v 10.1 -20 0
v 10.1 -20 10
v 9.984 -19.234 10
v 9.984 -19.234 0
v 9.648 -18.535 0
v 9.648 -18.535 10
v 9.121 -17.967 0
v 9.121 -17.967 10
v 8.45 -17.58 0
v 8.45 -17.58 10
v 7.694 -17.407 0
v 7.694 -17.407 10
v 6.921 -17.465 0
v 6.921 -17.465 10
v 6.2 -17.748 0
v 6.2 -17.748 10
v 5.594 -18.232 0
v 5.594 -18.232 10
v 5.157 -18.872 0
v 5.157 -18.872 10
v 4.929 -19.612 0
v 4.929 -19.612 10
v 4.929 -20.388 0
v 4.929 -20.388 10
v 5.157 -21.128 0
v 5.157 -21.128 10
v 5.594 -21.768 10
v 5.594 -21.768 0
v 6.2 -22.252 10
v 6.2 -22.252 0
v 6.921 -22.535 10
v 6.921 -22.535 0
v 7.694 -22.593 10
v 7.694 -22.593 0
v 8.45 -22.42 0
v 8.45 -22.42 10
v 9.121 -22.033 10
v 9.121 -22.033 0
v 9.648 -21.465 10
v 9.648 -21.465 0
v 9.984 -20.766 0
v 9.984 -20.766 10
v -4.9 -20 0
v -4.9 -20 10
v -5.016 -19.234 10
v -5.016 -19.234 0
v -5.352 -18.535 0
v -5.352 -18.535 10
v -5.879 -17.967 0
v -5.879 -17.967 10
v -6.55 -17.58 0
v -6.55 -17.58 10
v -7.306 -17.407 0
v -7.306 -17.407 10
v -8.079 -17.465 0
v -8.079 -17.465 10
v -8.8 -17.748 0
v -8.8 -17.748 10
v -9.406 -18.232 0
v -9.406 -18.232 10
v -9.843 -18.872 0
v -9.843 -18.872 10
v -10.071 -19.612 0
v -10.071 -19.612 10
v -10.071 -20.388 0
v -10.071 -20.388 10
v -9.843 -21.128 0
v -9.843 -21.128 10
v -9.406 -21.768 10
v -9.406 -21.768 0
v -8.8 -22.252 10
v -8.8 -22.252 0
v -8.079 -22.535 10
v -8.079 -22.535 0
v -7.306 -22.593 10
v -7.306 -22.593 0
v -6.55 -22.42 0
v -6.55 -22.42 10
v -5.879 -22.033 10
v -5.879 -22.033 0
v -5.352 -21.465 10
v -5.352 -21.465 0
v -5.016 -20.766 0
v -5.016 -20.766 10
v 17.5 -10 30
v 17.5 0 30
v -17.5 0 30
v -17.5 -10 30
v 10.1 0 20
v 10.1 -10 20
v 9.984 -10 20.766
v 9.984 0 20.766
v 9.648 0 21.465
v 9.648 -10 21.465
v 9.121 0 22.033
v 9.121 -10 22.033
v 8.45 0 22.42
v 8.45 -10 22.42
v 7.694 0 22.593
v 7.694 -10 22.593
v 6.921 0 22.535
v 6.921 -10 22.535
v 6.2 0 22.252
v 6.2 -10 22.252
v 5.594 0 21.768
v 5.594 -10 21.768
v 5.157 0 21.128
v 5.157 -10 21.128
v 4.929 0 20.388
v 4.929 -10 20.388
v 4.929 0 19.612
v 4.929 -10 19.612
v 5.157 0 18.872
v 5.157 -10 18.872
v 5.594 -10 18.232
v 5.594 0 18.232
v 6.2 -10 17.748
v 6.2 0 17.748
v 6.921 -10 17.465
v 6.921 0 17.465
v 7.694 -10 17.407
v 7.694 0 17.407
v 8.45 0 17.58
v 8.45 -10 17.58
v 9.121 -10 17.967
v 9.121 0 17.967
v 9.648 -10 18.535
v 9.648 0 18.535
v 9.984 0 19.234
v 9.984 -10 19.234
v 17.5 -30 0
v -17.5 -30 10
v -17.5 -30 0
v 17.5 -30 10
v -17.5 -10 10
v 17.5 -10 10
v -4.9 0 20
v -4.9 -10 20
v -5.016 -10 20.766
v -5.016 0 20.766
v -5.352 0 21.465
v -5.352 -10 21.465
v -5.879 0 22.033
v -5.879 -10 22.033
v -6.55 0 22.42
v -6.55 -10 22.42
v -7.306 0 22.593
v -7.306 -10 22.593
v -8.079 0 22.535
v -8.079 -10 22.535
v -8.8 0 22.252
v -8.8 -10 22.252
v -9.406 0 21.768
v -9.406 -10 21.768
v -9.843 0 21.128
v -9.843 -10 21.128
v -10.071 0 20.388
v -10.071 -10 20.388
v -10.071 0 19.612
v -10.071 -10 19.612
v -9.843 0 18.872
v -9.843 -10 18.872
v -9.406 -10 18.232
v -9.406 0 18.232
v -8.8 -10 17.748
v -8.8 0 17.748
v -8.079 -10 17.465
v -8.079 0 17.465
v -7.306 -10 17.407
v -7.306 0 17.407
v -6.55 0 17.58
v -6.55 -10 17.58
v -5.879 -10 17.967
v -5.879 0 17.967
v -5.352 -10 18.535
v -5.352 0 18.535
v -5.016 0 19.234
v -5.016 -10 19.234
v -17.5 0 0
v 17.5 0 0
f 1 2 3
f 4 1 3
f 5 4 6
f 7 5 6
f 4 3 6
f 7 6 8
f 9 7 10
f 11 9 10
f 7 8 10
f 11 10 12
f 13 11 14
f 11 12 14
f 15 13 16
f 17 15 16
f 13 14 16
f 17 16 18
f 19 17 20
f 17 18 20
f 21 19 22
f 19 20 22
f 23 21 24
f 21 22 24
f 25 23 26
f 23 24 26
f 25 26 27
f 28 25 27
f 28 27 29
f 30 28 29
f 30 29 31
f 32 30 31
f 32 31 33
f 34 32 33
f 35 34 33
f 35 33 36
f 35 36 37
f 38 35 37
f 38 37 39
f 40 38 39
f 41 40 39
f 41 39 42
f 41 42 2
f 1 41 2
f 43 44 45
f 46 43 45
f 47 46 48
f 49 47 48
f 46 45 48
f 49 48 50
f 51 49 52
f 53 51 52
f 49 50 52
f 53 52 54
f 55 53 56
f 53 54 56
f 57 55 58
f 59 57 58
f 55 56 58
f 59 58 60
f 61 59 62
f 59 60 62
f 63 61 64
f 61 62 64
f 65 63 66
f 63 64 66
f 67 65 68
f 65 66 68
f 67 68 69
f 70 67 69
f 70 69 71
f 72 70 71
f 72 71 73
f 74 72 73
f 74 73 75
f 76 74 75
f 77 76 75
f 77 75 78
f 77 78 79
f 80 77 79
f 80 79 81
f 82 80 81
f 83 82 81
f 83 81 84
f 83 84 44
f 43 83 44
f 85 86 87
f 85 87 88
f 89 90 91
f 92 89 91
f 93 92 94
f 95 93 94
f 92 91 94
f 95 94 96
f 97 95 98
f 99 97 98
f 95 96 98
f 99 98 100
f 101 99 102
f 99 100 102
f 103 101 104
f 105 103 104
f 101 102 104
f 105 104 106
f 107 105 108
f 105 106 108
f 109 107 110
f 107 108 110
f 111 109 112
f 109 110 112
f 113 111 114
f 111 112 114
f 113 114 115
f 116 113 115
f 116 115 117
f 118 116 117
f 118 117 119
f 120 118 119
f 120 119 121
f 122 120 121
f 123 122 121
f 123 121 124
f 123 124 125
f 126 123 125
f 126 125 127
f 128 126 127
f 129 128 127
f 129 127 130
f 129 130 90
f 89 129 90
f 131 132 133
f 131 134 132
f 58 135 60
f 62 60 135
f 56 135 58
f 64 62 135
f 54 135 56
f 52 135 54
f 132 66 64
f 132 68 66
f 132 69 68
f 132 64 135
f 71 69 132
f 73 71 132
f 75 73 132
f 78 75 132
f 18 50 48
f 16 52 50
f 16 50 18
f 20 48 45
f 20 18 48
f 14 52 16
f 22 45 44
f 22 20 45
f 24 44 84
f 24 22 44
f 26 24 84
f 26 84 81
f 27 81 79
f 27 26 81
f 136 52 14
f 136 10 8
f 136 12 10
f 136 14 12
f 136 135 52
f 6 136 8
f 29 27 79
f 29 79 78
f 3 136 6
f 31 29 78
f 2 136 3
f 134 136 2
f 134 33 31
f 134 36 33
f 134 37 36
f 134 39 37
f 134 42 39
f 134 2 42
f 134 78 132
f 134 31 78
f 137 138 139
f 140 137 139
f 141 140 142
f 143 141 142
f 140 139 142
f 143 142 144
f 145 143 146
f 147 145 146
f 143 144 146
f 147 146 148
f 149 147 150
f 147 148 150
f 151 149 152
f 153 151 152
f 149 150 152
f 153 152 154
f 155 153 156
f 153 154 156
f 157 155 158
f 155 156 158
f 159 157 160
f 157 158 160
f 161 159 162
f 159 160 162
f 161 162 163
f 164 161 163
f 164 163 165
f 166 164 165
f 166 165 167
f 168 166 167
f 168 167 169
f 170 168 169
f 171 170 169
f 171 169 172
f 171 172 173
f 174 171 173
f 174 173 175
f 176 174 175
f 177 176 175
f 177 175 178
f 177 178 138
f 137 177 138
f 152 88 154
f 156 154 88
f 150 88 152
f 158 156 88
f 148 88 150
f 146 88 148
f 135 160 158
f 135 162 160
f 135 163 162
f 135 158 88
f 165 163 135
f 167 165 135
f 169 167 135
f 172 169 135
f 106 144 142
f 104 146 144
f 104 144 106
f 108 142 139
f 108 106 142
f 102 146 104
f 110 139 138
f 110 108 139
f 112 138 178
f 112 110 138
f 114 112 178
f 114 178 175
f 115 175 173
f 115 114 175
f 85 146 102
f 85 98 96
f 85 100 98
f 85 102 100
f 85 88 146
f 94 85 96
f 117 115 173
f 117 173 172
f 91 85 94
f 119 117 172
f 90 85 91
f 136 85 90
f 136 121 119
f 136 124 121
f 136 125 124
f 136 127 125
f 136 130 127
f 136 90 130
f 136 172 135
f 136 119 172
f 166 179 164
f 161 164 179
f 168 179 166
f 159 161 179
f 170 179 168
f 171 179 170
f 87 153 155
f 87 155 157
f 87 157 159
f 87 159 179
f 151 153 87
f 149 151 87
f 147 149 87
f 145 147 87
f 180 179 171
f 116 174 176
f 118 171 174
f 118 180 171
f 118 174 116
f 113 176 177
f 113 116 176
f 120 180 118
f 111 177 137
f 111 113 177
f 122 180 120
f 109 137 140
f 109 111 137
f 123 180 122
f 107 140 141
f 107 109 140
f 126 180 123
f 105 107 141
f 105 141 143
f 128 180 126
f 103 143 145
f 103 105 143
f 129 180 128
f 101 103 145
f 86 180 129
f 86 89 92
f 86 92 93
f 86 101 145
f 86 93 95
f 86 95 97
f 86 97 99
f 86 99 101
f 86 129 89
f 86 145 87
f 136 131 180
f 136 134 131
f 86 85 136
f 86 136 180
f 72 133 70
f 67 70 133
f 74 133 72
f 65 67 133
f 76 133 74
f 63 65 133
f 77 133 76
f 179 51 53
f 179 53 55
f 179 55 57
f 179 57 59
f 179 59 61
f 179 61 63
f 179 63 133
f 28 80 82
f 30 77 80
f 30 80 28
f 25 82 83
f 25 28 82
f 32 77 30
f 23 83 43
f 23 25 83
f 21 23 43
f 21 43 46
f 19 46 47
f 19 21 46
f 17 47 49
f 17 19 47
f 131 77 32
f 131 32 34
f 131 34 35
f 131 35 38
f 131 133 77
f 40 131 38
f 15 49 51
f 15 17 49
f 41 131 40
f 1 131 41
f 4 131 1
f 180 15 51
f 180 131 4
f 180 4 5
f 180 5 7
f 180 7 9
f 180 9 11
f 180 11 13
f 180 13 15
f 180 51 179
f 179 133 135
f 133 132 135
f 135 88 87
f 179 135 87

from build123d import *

# Parameters (mm, degrees)
F1_DEPTH      = 17.5
F1_DEPTH_BACK = 17.5
F2_R          = 2.6
F3_DEPTH      = 10.001
F4_R          = 2.6
F5_DEPTH      = 10.001


with BuildPart() as f1:
    # F0 (on Right) → F1 (new body, two sides)
    with BuildSketch(Plane.YZ) as f1_sk:
        Polygon((-30, 0), (0, 0), (0, 30), (-10, 30), (-10, 10), (-30, 10), align=None)
    extrude(amount=F1_DEPTH)
    extrude(f1_sk.sketch, amount=-F1_DEPTH_BACK)

    # F2 (on face) → F3 (cut, through all)
    with BuildSketch(Plane.XZ.offset(10)):
        with Locations((-7.5, 20)):
            Circle(F2_R)
        with Locations((7.5, 20)):
            Circle(F2_R)
    extrude(amount=-F3_DEPTH, mode=Mode.SUBTRACT)

    # F4 (on face) → F5 (cut, through all)
    with BuildSketch(Plane.XY.offset(10)):
        with Locations((-7.5, -20)):
            Circle(F4_R)
        with Locations((7.5, -20)):
            Circle(F4_R)
    extrude(amount=-F5_DEPTH, mode=Mode.SUBTRACT)


solid = f1.part
